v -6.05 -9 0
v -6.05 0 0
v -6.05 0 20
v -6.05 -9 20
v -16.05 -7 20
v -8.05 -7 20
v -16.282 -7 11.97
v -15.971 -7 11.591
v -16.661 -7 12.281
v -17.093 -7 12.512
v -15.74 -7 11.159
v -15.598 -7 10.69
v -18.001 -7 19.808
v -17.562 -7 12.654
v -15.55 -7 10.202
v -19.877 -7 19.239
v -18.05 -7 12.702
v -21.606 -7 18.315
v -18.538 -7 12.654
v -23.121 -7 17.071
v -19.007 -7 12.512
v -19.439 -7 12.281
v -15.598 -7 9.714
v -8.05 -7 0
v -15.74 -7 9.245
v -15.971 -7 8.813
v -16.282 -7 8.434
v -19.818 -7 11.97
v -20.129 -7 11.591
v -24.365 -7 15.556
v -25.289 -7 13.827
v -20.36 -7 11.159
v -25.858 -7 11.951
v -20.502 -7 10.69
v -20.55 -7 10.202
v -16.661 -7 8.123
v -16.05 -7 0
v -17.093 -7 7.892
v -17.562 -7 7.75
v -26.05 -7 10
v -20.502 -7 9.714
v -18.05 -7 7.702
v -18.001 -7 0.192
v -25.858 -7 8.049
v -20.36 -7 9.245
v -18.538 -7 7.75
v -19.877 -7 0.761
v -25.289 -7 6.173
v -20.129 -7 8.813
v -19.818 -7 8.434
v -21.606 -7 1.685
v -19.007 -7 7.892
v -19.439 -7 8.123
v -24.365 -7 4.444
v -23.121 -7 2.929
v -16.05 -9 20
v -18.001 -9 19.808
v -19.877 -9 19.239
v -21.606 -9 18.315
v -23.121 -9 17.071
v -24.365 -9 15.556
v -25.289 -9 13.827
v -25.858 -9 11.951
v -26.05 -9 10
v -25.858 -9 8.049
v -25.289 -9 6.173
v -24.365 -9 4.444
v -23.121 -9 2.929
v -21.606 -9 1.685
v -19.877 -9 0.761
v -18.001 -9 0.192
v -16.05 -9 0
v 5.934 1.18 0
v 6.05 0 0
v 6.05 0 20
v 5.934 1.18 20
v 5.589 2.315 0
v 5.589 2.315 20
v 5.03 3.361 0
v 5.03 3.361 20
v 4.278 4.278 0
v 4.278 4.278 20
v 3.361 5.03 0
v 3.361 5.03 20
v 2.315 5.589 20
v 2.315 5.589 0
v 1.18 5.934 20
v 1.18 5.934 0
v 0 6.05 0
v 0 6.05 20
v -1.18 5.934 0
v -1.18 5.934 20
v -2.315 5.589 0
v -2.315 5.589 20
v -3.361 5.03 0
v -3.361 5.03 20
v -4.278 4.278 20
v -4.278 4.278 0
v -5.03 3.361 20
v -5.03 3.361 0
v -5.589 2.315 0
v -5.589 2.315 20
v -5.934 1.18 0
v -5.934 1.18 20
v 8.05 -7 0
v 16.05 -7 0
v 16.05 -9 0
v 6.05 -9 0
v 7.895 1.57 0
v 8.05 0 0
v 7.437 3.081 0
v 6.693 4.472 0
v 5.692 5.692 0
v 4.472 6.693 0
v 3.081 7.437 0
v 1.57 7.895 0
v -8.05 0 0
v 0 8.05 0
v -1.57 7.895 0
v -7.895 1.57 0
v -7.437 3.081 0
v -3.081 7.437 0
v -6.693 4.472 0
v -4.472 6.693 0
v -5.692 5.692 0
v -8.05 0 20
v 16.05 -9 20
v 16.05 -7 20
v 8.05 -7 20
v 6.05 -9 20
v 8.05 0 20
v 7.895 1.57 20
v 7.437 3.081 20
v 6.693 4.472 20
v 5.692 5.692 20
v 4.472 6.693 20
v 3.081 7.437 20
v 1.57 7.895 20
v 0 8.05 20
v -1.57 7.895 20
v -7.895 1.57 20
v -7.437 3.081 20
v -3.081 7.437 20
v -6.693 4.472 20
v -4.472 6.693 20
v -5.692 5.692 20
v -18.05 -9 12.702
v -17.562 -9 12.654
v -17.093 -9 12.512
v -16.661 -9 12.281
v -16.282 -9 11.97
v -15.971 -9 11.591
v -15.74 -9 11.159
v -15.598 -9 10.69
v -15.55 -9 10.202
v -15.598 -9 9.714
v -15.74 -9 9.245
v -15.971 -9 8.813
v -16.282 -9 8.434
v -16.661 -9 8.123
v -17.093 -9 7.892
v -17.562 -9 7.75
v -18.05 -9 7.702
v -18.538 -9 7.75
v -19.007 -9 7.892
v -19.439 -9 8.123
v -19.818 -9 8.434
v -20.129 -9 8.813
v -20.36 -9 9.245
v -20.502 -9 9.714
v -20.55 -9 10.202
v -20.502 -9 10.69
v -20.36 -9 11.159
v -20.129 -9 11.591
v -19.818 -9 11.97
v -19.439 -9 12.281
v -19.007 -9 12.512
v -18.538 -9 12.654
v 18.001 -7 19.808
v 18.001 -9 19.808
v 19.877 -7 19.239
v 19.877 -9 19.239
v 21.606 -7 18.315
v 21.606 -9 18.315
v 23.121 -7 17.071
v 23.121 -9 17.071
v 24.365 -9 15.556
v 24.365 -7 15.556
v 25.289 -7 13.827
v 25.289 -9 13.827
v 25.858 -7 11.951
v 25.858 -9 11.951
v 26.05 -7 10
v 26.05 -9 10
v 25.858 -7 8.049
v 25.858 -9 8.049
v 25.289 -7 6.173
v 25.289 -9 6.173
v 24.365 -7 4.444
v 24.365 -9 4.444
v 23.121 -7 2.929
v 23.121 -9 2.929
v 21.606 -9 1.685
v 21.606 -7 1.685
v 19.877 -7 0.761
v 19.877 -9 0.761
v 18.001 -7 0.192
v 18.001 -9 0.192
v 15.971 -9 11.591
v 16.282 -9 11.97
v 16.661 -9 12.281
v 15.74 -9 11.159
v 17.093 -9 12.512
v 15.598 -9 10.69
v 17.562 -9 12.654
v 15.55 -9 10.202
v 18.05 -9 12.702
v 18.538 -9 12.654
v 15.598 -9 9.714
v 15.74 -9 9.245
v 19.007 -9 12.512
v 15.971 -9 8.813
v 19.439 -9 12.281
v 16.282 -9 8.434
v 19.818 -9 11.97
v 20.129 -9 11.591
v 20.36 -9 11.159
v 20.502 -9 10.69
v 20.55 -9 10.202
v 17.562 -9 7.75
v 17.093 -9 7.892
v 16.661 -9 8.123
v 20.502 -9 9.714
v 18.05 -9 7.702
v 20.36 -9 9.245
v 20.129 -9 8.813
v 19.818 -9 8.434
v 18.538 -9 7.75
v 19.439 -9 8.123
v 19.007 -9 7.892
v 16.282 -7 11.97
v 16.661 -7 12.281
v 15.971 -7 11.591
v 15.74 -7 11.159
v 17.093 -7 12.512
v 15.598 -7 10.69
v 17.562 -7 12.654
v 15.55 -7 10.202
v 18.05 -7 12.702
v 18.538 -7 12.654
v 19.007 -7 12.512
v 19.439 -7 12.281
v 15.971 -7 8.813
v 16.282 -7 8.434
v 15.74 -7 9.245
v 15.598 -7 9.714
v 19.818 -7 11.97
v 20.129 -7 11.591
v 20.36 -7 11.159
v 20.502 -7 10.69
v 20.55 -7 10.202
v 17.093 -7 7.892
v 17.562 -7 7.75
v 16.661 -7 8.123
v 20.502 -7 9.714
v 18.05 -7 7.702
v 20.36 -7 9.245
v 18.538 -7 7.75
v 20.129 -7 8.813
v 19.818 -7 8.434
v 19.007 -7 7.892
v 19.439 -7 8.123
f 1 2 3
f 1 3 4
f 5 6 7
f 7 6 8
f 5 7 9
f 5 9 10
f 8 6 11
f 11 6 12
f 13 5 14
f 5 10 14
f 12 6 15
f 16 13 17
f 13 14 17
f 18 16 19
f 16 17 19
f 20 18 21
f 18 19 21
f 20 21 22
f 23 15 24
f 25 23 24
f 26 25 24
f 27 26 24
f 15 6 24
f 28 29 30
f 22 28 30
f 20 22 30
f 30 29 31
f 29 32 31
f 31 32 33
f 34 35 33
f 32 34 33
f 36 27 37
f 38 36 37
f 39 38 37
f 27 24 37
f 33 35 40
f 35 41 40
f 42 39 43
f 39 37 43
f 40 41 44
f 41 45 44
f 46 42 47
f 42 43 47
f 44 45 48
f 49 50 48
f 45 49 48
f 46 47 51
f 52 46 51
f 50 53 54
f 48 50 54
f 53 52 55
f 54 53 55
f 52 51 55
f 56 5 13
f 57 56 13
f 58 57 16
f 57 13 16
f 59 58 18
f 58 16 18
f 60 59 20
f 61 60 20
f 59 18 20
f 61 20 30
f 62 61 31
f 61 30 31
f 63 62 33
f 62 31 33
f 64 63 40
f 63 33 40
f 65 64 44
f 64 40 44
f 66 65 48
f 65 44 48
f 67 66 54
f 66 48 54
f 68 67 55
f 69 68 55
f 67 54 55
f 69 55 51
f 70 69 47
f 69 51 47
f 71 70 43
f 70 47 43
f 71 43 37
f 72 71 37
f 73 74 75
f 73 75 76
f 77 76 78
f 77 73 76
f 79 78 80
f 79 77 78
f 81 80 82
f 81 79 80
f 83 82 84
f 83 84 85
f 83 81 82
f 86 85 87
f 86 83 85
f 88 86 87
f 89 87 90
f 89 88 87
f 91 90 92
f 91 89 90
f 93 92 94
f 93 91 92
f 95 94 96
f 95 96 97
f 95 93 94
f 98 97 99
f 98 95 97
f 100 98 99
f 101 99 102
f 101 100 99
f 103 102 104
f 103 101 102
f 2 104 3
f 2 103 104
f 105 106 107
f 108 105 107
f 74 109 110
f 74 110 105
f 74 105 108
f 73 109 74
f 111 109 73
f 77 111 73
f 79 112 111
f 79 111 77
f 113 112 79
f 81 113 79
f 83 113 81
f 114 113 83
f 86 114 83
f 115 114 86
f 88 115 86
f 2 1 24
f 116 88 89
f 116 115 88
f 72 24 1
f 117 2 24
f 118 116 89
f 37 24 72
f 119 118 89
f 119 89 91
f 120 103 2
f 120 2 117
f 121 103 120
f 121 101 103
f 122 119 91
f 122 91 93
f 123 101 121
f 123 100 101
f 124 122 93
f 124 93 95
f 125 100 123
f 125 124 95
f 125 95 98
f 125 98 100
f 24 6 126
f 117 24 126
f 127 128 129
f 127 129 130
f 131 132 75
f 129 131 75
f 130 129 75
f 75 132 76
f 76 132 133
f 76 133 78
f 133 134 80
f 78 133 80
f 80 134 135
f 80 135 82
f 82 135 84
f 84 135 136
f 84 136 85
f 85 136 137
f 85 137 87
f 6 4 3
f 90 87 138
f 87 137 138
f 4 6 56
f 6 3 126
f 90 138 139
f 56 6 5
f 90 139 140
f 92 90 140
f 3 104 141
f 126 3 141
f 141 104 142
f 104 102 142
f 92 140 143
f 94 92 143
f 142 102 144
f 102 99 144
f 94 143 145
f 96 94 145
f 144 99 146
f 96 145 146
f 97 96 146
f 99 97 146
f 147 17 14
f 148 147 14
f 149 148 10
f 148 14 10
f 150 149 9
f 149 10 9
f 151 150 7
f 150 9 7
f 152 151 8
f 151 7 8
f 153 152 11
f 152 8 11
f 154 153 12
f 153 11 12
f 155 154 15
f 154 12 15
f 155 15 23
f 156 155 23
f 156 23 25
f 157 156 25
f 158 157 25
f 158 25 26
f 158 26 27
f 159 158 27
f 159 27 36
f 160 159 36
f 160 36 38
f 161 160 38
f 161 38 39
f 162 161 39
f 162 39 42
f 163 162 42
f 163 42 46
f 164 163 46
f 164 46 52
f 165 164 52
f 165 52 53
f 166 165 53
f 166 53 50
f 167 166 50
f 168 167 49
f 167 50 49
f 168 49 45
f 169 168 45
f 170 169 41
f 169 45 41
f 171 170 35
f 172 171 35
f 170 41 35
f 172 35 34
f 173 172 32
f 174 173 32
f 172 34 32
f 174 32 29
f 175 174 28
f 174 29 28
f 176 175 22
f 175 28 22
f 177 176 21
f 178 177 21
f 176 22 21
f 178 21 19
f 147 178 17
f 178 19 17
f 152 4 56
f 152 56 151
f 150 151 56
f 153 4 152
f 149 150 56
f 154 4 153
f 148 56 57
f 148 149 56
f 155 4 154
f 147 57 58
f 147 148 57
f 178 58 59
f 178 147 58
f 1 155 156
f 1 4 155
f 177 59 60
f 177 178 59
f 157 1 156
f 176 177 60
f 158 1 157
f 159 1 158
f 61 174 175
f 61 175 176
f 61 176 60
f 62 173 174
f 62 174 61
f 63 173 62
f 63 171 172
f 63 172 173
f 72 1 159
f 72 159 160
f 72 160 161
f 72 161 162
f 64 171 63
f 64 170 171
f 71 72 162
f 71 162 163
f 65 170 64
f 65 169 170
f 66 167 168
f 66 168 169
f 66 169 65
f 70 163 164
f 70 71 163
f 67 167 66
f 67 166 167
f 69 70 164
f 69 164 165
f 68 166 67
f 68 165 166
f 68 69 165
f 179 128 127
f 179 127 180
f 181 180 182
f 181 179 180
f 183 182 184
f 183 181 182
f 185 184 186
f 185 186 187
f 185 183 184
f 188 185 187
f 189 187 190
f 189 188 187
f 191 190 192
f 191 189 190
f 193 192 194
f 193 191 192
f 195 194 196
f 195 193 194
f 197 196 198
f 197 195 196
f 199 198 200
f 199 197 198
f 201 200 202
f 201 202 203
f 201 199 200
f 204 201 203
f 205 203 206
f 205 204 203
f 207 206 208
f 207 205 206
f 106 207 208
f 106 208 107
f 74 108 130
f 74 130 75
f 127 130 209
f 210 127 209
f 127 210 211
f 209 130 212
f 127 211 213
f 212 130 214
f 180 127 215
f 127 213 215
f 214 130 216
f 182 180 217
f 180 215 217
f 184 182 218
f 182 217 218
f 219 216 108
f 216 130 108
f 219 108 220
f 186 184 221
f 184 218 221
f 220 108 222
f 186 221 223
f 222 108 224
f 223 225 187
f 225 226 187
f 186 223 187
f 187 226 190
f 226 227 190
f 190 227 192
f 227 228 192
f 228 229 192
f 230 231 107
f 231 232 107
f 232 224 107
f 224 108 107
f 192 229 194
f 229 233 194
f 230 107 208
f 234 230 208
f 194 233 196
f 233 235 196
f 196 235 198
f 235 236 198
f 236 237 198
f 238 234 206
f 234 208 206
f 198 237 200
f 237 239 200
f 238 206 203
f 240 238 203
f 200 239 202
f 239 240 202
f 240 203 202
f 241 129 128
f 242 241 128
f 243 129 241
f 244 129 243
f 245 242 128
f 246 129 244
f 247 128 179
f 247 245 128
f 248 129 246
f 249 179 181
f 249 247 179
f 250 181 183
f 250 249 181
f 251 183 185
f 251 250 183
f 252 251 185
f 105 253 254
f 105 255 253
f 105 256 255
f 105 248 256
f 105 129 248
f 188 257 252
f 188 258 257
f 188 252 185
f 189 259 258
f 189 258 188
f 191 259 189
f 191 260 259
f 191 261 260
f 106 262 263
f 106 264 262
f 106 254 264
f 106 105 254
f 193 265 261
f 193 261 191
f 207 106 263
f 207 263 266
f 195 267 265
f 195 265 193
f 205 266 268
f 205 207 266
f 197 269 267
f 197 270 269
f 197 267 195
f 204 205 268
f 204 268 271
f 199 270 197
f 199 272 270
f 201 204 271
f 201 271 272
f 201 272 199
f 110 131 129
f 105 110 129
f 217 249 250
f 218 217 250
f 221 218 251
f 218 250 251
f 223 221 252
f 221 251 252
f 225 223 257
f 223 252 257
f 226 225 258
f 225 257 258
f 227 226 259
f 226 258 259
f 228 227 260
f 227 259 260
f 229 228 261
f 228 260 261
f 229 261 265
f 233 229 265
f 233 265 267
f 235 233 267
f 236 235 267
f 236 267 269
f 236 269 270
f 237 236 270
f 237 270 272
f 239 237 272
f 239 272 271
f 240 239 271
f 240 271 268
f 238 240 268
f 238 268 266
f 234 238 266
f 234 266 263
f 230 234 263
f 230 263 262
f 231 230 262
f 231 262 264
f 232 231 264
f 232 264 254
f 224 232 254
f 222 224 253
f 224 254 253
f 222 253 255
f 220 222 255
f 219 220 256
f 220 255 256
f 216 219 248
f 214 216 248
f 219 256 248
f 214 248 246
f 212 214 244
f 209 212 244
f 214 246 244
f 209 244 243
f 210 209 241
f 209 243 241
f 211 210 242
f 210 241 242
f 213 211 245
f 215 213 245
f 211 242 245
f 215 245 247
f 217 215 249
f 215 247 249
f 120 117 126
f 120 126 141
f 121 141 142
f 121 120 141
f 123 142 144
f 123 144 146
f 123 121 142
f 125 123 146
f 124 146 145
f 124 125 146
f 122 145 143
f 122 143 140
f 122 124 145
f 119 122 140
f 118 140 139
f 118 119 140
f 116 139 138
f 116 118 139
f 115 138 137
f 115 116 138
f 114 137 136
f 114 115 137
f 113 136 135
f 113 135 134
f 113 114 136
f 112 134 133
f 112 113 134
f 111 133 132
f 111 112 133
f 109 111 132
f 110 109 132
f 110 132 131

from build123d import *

# Parameters (mm, degrees)
Y_KSEKLIK_EKSTR_ZYON1_DEPTH = 20
Y_KSEKLIK_EKSTR_ZYON2_DEPTH = 2
IZIM3_R                     = 2.5
KES_EKSTR_ZYON1_DEPTH       = 10


with BuildPart() as part:
    # Çizim1 → Yükseklik-Ekstrüzyon1 (new body)
    with BuildSketch(Plane.XY):
        with BuildLine():
            Line((-6.05, 0), (-6.05, -9))
            Line((-6.05, -9), (-16.05, -9))
            Line((-16.05, -9), (-16.05, -7))
            Line((-16.05, -7), (-8.05, -7))
            Line((-8.05, -7), (-8.05, 0))
            ThreePointArc((-8.05, 0), (0, 8.05), (8.05, 0))
            Line((8.05, 0), (8.05, -7))
            Line((8.05, -7), (16.05, -7))
            Line((16.05, -7), (16.05, -9))
            Line((16.05, -9), (6.05, -9))
            Line((6.05, -9), (6.05, 0))
            ThreePointArc((6.05, 0), (0, 6.05), (-6.05, 0))
        make_face()
    extrude(amount=Y_KSEKLIK_EKSTR_ZYON1_DEPTH)

    # Çizim2 → Yükseklik-Ekstrüzyon2 (add)
    with BuildSketch(Plane(origin=(0, -7, 0), x_dir=(1, 0, 0), z_dir=(0, 1, 0))):
        with BuildLine():
            Line((16.05, 0), (16.05, -20))
            ThreePointArc((16.05, -20), (26.05, -10), (16.05, 0))
        make_face()
    y_kseklik_ekstr_zyon2 = extrude(amount=-Y_KSEKLIK_EKSTR_ZYON2_DEPTH)

    # Aynalama1: Yükseklik-Ekstrüzyon2 across plane
    add(y_kseklik_ekstr_zyon2.mirror(Plane(origin=(0, 0, 0), x_dir=(0, 0, 1), z_dir=(1, 0, 0))))

    # Çizim3 → Kes-Ekstrüzyon1 (cut)
    with BuildSketch(Plane(origin=(0, -7, 0), x_dir=(1, 0, 0), z_dir=(0, 1, 0))):
        with Locations(Location((18.05, -10.202041029, 0), (0, 0, 270))):
            Circle(IZIM3_R)
        with Locations(Location((-18.05, -10.202041029, 0), (0, 0, 270))):
            Circle(IZIM3_R)
    extrude(amount=-KES_EKSTR_ZYON1_DEPTH, mode=Mode.SUBTRACT)


solid = part.part
